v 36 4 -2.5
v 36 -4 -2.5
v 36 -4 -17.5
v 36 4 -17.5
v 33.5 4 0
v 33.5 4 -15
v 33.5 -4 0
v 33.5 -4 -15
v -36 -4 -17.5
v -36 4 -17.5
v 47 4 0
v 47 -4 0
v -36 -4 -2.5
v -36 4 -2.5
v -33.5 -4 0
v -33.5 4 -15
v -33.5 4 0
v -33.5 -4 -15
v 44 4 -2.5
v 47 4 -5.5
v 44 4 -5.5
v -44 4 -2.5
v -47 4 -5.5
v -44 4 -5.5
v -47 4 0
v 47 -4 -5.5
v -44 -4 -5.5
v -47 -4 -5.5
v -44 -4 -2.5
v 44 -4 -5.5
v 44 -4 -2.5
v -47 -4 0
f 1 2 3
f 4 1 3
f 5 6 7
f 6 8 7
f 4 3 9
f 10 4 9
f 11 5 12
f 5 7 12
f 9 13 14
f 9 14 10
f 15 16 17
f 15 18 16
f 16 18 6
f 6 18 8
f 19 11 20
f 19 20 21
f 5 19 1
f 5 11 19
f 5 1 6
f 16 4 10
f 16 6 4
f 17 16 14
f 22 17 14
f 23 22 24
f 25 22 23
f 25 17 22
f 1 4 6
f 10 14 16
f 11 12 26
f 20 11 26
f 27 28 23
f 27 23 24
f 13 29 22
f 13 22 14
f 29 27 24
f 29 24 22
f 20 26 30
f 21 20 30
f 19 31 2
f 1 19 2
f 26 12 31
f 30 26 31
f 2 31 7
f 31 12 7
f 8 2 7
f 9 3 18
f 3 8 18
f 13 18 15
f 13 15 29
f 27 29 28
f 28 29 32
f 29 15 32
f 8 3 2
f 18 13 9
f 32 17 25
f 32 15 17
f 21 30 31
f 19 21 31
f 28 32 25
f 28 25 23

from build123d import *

# Parameters (mm, degrees)
F0_W     = 3
F0_H     = 3
F1_DEPTH = 4


with BuildPart() as f1:
    # F0 (on Front) → F1 (new body, symmetric)
    with BuildSketch(Plane.XZ):
        Polygon((-33.5, 0), (-47, 0), (-47, -2.5), (-44, -2.5), (-36, -2.5), (-36, -17.5), (0, -17.5), (0, -15), (-33.5, -15), align=None)
        with Locations((-45.5, -4)):
            Rectangle(F0_W, F0_H)
    extrude(amount=F1_DEPTH, both=True)

    # F3: F1 across plane


with BuildPart() as f1_1:
    add(f1.part)
    add(f1.part.mirror(Plane.YZ))


solid = f1_1.part
